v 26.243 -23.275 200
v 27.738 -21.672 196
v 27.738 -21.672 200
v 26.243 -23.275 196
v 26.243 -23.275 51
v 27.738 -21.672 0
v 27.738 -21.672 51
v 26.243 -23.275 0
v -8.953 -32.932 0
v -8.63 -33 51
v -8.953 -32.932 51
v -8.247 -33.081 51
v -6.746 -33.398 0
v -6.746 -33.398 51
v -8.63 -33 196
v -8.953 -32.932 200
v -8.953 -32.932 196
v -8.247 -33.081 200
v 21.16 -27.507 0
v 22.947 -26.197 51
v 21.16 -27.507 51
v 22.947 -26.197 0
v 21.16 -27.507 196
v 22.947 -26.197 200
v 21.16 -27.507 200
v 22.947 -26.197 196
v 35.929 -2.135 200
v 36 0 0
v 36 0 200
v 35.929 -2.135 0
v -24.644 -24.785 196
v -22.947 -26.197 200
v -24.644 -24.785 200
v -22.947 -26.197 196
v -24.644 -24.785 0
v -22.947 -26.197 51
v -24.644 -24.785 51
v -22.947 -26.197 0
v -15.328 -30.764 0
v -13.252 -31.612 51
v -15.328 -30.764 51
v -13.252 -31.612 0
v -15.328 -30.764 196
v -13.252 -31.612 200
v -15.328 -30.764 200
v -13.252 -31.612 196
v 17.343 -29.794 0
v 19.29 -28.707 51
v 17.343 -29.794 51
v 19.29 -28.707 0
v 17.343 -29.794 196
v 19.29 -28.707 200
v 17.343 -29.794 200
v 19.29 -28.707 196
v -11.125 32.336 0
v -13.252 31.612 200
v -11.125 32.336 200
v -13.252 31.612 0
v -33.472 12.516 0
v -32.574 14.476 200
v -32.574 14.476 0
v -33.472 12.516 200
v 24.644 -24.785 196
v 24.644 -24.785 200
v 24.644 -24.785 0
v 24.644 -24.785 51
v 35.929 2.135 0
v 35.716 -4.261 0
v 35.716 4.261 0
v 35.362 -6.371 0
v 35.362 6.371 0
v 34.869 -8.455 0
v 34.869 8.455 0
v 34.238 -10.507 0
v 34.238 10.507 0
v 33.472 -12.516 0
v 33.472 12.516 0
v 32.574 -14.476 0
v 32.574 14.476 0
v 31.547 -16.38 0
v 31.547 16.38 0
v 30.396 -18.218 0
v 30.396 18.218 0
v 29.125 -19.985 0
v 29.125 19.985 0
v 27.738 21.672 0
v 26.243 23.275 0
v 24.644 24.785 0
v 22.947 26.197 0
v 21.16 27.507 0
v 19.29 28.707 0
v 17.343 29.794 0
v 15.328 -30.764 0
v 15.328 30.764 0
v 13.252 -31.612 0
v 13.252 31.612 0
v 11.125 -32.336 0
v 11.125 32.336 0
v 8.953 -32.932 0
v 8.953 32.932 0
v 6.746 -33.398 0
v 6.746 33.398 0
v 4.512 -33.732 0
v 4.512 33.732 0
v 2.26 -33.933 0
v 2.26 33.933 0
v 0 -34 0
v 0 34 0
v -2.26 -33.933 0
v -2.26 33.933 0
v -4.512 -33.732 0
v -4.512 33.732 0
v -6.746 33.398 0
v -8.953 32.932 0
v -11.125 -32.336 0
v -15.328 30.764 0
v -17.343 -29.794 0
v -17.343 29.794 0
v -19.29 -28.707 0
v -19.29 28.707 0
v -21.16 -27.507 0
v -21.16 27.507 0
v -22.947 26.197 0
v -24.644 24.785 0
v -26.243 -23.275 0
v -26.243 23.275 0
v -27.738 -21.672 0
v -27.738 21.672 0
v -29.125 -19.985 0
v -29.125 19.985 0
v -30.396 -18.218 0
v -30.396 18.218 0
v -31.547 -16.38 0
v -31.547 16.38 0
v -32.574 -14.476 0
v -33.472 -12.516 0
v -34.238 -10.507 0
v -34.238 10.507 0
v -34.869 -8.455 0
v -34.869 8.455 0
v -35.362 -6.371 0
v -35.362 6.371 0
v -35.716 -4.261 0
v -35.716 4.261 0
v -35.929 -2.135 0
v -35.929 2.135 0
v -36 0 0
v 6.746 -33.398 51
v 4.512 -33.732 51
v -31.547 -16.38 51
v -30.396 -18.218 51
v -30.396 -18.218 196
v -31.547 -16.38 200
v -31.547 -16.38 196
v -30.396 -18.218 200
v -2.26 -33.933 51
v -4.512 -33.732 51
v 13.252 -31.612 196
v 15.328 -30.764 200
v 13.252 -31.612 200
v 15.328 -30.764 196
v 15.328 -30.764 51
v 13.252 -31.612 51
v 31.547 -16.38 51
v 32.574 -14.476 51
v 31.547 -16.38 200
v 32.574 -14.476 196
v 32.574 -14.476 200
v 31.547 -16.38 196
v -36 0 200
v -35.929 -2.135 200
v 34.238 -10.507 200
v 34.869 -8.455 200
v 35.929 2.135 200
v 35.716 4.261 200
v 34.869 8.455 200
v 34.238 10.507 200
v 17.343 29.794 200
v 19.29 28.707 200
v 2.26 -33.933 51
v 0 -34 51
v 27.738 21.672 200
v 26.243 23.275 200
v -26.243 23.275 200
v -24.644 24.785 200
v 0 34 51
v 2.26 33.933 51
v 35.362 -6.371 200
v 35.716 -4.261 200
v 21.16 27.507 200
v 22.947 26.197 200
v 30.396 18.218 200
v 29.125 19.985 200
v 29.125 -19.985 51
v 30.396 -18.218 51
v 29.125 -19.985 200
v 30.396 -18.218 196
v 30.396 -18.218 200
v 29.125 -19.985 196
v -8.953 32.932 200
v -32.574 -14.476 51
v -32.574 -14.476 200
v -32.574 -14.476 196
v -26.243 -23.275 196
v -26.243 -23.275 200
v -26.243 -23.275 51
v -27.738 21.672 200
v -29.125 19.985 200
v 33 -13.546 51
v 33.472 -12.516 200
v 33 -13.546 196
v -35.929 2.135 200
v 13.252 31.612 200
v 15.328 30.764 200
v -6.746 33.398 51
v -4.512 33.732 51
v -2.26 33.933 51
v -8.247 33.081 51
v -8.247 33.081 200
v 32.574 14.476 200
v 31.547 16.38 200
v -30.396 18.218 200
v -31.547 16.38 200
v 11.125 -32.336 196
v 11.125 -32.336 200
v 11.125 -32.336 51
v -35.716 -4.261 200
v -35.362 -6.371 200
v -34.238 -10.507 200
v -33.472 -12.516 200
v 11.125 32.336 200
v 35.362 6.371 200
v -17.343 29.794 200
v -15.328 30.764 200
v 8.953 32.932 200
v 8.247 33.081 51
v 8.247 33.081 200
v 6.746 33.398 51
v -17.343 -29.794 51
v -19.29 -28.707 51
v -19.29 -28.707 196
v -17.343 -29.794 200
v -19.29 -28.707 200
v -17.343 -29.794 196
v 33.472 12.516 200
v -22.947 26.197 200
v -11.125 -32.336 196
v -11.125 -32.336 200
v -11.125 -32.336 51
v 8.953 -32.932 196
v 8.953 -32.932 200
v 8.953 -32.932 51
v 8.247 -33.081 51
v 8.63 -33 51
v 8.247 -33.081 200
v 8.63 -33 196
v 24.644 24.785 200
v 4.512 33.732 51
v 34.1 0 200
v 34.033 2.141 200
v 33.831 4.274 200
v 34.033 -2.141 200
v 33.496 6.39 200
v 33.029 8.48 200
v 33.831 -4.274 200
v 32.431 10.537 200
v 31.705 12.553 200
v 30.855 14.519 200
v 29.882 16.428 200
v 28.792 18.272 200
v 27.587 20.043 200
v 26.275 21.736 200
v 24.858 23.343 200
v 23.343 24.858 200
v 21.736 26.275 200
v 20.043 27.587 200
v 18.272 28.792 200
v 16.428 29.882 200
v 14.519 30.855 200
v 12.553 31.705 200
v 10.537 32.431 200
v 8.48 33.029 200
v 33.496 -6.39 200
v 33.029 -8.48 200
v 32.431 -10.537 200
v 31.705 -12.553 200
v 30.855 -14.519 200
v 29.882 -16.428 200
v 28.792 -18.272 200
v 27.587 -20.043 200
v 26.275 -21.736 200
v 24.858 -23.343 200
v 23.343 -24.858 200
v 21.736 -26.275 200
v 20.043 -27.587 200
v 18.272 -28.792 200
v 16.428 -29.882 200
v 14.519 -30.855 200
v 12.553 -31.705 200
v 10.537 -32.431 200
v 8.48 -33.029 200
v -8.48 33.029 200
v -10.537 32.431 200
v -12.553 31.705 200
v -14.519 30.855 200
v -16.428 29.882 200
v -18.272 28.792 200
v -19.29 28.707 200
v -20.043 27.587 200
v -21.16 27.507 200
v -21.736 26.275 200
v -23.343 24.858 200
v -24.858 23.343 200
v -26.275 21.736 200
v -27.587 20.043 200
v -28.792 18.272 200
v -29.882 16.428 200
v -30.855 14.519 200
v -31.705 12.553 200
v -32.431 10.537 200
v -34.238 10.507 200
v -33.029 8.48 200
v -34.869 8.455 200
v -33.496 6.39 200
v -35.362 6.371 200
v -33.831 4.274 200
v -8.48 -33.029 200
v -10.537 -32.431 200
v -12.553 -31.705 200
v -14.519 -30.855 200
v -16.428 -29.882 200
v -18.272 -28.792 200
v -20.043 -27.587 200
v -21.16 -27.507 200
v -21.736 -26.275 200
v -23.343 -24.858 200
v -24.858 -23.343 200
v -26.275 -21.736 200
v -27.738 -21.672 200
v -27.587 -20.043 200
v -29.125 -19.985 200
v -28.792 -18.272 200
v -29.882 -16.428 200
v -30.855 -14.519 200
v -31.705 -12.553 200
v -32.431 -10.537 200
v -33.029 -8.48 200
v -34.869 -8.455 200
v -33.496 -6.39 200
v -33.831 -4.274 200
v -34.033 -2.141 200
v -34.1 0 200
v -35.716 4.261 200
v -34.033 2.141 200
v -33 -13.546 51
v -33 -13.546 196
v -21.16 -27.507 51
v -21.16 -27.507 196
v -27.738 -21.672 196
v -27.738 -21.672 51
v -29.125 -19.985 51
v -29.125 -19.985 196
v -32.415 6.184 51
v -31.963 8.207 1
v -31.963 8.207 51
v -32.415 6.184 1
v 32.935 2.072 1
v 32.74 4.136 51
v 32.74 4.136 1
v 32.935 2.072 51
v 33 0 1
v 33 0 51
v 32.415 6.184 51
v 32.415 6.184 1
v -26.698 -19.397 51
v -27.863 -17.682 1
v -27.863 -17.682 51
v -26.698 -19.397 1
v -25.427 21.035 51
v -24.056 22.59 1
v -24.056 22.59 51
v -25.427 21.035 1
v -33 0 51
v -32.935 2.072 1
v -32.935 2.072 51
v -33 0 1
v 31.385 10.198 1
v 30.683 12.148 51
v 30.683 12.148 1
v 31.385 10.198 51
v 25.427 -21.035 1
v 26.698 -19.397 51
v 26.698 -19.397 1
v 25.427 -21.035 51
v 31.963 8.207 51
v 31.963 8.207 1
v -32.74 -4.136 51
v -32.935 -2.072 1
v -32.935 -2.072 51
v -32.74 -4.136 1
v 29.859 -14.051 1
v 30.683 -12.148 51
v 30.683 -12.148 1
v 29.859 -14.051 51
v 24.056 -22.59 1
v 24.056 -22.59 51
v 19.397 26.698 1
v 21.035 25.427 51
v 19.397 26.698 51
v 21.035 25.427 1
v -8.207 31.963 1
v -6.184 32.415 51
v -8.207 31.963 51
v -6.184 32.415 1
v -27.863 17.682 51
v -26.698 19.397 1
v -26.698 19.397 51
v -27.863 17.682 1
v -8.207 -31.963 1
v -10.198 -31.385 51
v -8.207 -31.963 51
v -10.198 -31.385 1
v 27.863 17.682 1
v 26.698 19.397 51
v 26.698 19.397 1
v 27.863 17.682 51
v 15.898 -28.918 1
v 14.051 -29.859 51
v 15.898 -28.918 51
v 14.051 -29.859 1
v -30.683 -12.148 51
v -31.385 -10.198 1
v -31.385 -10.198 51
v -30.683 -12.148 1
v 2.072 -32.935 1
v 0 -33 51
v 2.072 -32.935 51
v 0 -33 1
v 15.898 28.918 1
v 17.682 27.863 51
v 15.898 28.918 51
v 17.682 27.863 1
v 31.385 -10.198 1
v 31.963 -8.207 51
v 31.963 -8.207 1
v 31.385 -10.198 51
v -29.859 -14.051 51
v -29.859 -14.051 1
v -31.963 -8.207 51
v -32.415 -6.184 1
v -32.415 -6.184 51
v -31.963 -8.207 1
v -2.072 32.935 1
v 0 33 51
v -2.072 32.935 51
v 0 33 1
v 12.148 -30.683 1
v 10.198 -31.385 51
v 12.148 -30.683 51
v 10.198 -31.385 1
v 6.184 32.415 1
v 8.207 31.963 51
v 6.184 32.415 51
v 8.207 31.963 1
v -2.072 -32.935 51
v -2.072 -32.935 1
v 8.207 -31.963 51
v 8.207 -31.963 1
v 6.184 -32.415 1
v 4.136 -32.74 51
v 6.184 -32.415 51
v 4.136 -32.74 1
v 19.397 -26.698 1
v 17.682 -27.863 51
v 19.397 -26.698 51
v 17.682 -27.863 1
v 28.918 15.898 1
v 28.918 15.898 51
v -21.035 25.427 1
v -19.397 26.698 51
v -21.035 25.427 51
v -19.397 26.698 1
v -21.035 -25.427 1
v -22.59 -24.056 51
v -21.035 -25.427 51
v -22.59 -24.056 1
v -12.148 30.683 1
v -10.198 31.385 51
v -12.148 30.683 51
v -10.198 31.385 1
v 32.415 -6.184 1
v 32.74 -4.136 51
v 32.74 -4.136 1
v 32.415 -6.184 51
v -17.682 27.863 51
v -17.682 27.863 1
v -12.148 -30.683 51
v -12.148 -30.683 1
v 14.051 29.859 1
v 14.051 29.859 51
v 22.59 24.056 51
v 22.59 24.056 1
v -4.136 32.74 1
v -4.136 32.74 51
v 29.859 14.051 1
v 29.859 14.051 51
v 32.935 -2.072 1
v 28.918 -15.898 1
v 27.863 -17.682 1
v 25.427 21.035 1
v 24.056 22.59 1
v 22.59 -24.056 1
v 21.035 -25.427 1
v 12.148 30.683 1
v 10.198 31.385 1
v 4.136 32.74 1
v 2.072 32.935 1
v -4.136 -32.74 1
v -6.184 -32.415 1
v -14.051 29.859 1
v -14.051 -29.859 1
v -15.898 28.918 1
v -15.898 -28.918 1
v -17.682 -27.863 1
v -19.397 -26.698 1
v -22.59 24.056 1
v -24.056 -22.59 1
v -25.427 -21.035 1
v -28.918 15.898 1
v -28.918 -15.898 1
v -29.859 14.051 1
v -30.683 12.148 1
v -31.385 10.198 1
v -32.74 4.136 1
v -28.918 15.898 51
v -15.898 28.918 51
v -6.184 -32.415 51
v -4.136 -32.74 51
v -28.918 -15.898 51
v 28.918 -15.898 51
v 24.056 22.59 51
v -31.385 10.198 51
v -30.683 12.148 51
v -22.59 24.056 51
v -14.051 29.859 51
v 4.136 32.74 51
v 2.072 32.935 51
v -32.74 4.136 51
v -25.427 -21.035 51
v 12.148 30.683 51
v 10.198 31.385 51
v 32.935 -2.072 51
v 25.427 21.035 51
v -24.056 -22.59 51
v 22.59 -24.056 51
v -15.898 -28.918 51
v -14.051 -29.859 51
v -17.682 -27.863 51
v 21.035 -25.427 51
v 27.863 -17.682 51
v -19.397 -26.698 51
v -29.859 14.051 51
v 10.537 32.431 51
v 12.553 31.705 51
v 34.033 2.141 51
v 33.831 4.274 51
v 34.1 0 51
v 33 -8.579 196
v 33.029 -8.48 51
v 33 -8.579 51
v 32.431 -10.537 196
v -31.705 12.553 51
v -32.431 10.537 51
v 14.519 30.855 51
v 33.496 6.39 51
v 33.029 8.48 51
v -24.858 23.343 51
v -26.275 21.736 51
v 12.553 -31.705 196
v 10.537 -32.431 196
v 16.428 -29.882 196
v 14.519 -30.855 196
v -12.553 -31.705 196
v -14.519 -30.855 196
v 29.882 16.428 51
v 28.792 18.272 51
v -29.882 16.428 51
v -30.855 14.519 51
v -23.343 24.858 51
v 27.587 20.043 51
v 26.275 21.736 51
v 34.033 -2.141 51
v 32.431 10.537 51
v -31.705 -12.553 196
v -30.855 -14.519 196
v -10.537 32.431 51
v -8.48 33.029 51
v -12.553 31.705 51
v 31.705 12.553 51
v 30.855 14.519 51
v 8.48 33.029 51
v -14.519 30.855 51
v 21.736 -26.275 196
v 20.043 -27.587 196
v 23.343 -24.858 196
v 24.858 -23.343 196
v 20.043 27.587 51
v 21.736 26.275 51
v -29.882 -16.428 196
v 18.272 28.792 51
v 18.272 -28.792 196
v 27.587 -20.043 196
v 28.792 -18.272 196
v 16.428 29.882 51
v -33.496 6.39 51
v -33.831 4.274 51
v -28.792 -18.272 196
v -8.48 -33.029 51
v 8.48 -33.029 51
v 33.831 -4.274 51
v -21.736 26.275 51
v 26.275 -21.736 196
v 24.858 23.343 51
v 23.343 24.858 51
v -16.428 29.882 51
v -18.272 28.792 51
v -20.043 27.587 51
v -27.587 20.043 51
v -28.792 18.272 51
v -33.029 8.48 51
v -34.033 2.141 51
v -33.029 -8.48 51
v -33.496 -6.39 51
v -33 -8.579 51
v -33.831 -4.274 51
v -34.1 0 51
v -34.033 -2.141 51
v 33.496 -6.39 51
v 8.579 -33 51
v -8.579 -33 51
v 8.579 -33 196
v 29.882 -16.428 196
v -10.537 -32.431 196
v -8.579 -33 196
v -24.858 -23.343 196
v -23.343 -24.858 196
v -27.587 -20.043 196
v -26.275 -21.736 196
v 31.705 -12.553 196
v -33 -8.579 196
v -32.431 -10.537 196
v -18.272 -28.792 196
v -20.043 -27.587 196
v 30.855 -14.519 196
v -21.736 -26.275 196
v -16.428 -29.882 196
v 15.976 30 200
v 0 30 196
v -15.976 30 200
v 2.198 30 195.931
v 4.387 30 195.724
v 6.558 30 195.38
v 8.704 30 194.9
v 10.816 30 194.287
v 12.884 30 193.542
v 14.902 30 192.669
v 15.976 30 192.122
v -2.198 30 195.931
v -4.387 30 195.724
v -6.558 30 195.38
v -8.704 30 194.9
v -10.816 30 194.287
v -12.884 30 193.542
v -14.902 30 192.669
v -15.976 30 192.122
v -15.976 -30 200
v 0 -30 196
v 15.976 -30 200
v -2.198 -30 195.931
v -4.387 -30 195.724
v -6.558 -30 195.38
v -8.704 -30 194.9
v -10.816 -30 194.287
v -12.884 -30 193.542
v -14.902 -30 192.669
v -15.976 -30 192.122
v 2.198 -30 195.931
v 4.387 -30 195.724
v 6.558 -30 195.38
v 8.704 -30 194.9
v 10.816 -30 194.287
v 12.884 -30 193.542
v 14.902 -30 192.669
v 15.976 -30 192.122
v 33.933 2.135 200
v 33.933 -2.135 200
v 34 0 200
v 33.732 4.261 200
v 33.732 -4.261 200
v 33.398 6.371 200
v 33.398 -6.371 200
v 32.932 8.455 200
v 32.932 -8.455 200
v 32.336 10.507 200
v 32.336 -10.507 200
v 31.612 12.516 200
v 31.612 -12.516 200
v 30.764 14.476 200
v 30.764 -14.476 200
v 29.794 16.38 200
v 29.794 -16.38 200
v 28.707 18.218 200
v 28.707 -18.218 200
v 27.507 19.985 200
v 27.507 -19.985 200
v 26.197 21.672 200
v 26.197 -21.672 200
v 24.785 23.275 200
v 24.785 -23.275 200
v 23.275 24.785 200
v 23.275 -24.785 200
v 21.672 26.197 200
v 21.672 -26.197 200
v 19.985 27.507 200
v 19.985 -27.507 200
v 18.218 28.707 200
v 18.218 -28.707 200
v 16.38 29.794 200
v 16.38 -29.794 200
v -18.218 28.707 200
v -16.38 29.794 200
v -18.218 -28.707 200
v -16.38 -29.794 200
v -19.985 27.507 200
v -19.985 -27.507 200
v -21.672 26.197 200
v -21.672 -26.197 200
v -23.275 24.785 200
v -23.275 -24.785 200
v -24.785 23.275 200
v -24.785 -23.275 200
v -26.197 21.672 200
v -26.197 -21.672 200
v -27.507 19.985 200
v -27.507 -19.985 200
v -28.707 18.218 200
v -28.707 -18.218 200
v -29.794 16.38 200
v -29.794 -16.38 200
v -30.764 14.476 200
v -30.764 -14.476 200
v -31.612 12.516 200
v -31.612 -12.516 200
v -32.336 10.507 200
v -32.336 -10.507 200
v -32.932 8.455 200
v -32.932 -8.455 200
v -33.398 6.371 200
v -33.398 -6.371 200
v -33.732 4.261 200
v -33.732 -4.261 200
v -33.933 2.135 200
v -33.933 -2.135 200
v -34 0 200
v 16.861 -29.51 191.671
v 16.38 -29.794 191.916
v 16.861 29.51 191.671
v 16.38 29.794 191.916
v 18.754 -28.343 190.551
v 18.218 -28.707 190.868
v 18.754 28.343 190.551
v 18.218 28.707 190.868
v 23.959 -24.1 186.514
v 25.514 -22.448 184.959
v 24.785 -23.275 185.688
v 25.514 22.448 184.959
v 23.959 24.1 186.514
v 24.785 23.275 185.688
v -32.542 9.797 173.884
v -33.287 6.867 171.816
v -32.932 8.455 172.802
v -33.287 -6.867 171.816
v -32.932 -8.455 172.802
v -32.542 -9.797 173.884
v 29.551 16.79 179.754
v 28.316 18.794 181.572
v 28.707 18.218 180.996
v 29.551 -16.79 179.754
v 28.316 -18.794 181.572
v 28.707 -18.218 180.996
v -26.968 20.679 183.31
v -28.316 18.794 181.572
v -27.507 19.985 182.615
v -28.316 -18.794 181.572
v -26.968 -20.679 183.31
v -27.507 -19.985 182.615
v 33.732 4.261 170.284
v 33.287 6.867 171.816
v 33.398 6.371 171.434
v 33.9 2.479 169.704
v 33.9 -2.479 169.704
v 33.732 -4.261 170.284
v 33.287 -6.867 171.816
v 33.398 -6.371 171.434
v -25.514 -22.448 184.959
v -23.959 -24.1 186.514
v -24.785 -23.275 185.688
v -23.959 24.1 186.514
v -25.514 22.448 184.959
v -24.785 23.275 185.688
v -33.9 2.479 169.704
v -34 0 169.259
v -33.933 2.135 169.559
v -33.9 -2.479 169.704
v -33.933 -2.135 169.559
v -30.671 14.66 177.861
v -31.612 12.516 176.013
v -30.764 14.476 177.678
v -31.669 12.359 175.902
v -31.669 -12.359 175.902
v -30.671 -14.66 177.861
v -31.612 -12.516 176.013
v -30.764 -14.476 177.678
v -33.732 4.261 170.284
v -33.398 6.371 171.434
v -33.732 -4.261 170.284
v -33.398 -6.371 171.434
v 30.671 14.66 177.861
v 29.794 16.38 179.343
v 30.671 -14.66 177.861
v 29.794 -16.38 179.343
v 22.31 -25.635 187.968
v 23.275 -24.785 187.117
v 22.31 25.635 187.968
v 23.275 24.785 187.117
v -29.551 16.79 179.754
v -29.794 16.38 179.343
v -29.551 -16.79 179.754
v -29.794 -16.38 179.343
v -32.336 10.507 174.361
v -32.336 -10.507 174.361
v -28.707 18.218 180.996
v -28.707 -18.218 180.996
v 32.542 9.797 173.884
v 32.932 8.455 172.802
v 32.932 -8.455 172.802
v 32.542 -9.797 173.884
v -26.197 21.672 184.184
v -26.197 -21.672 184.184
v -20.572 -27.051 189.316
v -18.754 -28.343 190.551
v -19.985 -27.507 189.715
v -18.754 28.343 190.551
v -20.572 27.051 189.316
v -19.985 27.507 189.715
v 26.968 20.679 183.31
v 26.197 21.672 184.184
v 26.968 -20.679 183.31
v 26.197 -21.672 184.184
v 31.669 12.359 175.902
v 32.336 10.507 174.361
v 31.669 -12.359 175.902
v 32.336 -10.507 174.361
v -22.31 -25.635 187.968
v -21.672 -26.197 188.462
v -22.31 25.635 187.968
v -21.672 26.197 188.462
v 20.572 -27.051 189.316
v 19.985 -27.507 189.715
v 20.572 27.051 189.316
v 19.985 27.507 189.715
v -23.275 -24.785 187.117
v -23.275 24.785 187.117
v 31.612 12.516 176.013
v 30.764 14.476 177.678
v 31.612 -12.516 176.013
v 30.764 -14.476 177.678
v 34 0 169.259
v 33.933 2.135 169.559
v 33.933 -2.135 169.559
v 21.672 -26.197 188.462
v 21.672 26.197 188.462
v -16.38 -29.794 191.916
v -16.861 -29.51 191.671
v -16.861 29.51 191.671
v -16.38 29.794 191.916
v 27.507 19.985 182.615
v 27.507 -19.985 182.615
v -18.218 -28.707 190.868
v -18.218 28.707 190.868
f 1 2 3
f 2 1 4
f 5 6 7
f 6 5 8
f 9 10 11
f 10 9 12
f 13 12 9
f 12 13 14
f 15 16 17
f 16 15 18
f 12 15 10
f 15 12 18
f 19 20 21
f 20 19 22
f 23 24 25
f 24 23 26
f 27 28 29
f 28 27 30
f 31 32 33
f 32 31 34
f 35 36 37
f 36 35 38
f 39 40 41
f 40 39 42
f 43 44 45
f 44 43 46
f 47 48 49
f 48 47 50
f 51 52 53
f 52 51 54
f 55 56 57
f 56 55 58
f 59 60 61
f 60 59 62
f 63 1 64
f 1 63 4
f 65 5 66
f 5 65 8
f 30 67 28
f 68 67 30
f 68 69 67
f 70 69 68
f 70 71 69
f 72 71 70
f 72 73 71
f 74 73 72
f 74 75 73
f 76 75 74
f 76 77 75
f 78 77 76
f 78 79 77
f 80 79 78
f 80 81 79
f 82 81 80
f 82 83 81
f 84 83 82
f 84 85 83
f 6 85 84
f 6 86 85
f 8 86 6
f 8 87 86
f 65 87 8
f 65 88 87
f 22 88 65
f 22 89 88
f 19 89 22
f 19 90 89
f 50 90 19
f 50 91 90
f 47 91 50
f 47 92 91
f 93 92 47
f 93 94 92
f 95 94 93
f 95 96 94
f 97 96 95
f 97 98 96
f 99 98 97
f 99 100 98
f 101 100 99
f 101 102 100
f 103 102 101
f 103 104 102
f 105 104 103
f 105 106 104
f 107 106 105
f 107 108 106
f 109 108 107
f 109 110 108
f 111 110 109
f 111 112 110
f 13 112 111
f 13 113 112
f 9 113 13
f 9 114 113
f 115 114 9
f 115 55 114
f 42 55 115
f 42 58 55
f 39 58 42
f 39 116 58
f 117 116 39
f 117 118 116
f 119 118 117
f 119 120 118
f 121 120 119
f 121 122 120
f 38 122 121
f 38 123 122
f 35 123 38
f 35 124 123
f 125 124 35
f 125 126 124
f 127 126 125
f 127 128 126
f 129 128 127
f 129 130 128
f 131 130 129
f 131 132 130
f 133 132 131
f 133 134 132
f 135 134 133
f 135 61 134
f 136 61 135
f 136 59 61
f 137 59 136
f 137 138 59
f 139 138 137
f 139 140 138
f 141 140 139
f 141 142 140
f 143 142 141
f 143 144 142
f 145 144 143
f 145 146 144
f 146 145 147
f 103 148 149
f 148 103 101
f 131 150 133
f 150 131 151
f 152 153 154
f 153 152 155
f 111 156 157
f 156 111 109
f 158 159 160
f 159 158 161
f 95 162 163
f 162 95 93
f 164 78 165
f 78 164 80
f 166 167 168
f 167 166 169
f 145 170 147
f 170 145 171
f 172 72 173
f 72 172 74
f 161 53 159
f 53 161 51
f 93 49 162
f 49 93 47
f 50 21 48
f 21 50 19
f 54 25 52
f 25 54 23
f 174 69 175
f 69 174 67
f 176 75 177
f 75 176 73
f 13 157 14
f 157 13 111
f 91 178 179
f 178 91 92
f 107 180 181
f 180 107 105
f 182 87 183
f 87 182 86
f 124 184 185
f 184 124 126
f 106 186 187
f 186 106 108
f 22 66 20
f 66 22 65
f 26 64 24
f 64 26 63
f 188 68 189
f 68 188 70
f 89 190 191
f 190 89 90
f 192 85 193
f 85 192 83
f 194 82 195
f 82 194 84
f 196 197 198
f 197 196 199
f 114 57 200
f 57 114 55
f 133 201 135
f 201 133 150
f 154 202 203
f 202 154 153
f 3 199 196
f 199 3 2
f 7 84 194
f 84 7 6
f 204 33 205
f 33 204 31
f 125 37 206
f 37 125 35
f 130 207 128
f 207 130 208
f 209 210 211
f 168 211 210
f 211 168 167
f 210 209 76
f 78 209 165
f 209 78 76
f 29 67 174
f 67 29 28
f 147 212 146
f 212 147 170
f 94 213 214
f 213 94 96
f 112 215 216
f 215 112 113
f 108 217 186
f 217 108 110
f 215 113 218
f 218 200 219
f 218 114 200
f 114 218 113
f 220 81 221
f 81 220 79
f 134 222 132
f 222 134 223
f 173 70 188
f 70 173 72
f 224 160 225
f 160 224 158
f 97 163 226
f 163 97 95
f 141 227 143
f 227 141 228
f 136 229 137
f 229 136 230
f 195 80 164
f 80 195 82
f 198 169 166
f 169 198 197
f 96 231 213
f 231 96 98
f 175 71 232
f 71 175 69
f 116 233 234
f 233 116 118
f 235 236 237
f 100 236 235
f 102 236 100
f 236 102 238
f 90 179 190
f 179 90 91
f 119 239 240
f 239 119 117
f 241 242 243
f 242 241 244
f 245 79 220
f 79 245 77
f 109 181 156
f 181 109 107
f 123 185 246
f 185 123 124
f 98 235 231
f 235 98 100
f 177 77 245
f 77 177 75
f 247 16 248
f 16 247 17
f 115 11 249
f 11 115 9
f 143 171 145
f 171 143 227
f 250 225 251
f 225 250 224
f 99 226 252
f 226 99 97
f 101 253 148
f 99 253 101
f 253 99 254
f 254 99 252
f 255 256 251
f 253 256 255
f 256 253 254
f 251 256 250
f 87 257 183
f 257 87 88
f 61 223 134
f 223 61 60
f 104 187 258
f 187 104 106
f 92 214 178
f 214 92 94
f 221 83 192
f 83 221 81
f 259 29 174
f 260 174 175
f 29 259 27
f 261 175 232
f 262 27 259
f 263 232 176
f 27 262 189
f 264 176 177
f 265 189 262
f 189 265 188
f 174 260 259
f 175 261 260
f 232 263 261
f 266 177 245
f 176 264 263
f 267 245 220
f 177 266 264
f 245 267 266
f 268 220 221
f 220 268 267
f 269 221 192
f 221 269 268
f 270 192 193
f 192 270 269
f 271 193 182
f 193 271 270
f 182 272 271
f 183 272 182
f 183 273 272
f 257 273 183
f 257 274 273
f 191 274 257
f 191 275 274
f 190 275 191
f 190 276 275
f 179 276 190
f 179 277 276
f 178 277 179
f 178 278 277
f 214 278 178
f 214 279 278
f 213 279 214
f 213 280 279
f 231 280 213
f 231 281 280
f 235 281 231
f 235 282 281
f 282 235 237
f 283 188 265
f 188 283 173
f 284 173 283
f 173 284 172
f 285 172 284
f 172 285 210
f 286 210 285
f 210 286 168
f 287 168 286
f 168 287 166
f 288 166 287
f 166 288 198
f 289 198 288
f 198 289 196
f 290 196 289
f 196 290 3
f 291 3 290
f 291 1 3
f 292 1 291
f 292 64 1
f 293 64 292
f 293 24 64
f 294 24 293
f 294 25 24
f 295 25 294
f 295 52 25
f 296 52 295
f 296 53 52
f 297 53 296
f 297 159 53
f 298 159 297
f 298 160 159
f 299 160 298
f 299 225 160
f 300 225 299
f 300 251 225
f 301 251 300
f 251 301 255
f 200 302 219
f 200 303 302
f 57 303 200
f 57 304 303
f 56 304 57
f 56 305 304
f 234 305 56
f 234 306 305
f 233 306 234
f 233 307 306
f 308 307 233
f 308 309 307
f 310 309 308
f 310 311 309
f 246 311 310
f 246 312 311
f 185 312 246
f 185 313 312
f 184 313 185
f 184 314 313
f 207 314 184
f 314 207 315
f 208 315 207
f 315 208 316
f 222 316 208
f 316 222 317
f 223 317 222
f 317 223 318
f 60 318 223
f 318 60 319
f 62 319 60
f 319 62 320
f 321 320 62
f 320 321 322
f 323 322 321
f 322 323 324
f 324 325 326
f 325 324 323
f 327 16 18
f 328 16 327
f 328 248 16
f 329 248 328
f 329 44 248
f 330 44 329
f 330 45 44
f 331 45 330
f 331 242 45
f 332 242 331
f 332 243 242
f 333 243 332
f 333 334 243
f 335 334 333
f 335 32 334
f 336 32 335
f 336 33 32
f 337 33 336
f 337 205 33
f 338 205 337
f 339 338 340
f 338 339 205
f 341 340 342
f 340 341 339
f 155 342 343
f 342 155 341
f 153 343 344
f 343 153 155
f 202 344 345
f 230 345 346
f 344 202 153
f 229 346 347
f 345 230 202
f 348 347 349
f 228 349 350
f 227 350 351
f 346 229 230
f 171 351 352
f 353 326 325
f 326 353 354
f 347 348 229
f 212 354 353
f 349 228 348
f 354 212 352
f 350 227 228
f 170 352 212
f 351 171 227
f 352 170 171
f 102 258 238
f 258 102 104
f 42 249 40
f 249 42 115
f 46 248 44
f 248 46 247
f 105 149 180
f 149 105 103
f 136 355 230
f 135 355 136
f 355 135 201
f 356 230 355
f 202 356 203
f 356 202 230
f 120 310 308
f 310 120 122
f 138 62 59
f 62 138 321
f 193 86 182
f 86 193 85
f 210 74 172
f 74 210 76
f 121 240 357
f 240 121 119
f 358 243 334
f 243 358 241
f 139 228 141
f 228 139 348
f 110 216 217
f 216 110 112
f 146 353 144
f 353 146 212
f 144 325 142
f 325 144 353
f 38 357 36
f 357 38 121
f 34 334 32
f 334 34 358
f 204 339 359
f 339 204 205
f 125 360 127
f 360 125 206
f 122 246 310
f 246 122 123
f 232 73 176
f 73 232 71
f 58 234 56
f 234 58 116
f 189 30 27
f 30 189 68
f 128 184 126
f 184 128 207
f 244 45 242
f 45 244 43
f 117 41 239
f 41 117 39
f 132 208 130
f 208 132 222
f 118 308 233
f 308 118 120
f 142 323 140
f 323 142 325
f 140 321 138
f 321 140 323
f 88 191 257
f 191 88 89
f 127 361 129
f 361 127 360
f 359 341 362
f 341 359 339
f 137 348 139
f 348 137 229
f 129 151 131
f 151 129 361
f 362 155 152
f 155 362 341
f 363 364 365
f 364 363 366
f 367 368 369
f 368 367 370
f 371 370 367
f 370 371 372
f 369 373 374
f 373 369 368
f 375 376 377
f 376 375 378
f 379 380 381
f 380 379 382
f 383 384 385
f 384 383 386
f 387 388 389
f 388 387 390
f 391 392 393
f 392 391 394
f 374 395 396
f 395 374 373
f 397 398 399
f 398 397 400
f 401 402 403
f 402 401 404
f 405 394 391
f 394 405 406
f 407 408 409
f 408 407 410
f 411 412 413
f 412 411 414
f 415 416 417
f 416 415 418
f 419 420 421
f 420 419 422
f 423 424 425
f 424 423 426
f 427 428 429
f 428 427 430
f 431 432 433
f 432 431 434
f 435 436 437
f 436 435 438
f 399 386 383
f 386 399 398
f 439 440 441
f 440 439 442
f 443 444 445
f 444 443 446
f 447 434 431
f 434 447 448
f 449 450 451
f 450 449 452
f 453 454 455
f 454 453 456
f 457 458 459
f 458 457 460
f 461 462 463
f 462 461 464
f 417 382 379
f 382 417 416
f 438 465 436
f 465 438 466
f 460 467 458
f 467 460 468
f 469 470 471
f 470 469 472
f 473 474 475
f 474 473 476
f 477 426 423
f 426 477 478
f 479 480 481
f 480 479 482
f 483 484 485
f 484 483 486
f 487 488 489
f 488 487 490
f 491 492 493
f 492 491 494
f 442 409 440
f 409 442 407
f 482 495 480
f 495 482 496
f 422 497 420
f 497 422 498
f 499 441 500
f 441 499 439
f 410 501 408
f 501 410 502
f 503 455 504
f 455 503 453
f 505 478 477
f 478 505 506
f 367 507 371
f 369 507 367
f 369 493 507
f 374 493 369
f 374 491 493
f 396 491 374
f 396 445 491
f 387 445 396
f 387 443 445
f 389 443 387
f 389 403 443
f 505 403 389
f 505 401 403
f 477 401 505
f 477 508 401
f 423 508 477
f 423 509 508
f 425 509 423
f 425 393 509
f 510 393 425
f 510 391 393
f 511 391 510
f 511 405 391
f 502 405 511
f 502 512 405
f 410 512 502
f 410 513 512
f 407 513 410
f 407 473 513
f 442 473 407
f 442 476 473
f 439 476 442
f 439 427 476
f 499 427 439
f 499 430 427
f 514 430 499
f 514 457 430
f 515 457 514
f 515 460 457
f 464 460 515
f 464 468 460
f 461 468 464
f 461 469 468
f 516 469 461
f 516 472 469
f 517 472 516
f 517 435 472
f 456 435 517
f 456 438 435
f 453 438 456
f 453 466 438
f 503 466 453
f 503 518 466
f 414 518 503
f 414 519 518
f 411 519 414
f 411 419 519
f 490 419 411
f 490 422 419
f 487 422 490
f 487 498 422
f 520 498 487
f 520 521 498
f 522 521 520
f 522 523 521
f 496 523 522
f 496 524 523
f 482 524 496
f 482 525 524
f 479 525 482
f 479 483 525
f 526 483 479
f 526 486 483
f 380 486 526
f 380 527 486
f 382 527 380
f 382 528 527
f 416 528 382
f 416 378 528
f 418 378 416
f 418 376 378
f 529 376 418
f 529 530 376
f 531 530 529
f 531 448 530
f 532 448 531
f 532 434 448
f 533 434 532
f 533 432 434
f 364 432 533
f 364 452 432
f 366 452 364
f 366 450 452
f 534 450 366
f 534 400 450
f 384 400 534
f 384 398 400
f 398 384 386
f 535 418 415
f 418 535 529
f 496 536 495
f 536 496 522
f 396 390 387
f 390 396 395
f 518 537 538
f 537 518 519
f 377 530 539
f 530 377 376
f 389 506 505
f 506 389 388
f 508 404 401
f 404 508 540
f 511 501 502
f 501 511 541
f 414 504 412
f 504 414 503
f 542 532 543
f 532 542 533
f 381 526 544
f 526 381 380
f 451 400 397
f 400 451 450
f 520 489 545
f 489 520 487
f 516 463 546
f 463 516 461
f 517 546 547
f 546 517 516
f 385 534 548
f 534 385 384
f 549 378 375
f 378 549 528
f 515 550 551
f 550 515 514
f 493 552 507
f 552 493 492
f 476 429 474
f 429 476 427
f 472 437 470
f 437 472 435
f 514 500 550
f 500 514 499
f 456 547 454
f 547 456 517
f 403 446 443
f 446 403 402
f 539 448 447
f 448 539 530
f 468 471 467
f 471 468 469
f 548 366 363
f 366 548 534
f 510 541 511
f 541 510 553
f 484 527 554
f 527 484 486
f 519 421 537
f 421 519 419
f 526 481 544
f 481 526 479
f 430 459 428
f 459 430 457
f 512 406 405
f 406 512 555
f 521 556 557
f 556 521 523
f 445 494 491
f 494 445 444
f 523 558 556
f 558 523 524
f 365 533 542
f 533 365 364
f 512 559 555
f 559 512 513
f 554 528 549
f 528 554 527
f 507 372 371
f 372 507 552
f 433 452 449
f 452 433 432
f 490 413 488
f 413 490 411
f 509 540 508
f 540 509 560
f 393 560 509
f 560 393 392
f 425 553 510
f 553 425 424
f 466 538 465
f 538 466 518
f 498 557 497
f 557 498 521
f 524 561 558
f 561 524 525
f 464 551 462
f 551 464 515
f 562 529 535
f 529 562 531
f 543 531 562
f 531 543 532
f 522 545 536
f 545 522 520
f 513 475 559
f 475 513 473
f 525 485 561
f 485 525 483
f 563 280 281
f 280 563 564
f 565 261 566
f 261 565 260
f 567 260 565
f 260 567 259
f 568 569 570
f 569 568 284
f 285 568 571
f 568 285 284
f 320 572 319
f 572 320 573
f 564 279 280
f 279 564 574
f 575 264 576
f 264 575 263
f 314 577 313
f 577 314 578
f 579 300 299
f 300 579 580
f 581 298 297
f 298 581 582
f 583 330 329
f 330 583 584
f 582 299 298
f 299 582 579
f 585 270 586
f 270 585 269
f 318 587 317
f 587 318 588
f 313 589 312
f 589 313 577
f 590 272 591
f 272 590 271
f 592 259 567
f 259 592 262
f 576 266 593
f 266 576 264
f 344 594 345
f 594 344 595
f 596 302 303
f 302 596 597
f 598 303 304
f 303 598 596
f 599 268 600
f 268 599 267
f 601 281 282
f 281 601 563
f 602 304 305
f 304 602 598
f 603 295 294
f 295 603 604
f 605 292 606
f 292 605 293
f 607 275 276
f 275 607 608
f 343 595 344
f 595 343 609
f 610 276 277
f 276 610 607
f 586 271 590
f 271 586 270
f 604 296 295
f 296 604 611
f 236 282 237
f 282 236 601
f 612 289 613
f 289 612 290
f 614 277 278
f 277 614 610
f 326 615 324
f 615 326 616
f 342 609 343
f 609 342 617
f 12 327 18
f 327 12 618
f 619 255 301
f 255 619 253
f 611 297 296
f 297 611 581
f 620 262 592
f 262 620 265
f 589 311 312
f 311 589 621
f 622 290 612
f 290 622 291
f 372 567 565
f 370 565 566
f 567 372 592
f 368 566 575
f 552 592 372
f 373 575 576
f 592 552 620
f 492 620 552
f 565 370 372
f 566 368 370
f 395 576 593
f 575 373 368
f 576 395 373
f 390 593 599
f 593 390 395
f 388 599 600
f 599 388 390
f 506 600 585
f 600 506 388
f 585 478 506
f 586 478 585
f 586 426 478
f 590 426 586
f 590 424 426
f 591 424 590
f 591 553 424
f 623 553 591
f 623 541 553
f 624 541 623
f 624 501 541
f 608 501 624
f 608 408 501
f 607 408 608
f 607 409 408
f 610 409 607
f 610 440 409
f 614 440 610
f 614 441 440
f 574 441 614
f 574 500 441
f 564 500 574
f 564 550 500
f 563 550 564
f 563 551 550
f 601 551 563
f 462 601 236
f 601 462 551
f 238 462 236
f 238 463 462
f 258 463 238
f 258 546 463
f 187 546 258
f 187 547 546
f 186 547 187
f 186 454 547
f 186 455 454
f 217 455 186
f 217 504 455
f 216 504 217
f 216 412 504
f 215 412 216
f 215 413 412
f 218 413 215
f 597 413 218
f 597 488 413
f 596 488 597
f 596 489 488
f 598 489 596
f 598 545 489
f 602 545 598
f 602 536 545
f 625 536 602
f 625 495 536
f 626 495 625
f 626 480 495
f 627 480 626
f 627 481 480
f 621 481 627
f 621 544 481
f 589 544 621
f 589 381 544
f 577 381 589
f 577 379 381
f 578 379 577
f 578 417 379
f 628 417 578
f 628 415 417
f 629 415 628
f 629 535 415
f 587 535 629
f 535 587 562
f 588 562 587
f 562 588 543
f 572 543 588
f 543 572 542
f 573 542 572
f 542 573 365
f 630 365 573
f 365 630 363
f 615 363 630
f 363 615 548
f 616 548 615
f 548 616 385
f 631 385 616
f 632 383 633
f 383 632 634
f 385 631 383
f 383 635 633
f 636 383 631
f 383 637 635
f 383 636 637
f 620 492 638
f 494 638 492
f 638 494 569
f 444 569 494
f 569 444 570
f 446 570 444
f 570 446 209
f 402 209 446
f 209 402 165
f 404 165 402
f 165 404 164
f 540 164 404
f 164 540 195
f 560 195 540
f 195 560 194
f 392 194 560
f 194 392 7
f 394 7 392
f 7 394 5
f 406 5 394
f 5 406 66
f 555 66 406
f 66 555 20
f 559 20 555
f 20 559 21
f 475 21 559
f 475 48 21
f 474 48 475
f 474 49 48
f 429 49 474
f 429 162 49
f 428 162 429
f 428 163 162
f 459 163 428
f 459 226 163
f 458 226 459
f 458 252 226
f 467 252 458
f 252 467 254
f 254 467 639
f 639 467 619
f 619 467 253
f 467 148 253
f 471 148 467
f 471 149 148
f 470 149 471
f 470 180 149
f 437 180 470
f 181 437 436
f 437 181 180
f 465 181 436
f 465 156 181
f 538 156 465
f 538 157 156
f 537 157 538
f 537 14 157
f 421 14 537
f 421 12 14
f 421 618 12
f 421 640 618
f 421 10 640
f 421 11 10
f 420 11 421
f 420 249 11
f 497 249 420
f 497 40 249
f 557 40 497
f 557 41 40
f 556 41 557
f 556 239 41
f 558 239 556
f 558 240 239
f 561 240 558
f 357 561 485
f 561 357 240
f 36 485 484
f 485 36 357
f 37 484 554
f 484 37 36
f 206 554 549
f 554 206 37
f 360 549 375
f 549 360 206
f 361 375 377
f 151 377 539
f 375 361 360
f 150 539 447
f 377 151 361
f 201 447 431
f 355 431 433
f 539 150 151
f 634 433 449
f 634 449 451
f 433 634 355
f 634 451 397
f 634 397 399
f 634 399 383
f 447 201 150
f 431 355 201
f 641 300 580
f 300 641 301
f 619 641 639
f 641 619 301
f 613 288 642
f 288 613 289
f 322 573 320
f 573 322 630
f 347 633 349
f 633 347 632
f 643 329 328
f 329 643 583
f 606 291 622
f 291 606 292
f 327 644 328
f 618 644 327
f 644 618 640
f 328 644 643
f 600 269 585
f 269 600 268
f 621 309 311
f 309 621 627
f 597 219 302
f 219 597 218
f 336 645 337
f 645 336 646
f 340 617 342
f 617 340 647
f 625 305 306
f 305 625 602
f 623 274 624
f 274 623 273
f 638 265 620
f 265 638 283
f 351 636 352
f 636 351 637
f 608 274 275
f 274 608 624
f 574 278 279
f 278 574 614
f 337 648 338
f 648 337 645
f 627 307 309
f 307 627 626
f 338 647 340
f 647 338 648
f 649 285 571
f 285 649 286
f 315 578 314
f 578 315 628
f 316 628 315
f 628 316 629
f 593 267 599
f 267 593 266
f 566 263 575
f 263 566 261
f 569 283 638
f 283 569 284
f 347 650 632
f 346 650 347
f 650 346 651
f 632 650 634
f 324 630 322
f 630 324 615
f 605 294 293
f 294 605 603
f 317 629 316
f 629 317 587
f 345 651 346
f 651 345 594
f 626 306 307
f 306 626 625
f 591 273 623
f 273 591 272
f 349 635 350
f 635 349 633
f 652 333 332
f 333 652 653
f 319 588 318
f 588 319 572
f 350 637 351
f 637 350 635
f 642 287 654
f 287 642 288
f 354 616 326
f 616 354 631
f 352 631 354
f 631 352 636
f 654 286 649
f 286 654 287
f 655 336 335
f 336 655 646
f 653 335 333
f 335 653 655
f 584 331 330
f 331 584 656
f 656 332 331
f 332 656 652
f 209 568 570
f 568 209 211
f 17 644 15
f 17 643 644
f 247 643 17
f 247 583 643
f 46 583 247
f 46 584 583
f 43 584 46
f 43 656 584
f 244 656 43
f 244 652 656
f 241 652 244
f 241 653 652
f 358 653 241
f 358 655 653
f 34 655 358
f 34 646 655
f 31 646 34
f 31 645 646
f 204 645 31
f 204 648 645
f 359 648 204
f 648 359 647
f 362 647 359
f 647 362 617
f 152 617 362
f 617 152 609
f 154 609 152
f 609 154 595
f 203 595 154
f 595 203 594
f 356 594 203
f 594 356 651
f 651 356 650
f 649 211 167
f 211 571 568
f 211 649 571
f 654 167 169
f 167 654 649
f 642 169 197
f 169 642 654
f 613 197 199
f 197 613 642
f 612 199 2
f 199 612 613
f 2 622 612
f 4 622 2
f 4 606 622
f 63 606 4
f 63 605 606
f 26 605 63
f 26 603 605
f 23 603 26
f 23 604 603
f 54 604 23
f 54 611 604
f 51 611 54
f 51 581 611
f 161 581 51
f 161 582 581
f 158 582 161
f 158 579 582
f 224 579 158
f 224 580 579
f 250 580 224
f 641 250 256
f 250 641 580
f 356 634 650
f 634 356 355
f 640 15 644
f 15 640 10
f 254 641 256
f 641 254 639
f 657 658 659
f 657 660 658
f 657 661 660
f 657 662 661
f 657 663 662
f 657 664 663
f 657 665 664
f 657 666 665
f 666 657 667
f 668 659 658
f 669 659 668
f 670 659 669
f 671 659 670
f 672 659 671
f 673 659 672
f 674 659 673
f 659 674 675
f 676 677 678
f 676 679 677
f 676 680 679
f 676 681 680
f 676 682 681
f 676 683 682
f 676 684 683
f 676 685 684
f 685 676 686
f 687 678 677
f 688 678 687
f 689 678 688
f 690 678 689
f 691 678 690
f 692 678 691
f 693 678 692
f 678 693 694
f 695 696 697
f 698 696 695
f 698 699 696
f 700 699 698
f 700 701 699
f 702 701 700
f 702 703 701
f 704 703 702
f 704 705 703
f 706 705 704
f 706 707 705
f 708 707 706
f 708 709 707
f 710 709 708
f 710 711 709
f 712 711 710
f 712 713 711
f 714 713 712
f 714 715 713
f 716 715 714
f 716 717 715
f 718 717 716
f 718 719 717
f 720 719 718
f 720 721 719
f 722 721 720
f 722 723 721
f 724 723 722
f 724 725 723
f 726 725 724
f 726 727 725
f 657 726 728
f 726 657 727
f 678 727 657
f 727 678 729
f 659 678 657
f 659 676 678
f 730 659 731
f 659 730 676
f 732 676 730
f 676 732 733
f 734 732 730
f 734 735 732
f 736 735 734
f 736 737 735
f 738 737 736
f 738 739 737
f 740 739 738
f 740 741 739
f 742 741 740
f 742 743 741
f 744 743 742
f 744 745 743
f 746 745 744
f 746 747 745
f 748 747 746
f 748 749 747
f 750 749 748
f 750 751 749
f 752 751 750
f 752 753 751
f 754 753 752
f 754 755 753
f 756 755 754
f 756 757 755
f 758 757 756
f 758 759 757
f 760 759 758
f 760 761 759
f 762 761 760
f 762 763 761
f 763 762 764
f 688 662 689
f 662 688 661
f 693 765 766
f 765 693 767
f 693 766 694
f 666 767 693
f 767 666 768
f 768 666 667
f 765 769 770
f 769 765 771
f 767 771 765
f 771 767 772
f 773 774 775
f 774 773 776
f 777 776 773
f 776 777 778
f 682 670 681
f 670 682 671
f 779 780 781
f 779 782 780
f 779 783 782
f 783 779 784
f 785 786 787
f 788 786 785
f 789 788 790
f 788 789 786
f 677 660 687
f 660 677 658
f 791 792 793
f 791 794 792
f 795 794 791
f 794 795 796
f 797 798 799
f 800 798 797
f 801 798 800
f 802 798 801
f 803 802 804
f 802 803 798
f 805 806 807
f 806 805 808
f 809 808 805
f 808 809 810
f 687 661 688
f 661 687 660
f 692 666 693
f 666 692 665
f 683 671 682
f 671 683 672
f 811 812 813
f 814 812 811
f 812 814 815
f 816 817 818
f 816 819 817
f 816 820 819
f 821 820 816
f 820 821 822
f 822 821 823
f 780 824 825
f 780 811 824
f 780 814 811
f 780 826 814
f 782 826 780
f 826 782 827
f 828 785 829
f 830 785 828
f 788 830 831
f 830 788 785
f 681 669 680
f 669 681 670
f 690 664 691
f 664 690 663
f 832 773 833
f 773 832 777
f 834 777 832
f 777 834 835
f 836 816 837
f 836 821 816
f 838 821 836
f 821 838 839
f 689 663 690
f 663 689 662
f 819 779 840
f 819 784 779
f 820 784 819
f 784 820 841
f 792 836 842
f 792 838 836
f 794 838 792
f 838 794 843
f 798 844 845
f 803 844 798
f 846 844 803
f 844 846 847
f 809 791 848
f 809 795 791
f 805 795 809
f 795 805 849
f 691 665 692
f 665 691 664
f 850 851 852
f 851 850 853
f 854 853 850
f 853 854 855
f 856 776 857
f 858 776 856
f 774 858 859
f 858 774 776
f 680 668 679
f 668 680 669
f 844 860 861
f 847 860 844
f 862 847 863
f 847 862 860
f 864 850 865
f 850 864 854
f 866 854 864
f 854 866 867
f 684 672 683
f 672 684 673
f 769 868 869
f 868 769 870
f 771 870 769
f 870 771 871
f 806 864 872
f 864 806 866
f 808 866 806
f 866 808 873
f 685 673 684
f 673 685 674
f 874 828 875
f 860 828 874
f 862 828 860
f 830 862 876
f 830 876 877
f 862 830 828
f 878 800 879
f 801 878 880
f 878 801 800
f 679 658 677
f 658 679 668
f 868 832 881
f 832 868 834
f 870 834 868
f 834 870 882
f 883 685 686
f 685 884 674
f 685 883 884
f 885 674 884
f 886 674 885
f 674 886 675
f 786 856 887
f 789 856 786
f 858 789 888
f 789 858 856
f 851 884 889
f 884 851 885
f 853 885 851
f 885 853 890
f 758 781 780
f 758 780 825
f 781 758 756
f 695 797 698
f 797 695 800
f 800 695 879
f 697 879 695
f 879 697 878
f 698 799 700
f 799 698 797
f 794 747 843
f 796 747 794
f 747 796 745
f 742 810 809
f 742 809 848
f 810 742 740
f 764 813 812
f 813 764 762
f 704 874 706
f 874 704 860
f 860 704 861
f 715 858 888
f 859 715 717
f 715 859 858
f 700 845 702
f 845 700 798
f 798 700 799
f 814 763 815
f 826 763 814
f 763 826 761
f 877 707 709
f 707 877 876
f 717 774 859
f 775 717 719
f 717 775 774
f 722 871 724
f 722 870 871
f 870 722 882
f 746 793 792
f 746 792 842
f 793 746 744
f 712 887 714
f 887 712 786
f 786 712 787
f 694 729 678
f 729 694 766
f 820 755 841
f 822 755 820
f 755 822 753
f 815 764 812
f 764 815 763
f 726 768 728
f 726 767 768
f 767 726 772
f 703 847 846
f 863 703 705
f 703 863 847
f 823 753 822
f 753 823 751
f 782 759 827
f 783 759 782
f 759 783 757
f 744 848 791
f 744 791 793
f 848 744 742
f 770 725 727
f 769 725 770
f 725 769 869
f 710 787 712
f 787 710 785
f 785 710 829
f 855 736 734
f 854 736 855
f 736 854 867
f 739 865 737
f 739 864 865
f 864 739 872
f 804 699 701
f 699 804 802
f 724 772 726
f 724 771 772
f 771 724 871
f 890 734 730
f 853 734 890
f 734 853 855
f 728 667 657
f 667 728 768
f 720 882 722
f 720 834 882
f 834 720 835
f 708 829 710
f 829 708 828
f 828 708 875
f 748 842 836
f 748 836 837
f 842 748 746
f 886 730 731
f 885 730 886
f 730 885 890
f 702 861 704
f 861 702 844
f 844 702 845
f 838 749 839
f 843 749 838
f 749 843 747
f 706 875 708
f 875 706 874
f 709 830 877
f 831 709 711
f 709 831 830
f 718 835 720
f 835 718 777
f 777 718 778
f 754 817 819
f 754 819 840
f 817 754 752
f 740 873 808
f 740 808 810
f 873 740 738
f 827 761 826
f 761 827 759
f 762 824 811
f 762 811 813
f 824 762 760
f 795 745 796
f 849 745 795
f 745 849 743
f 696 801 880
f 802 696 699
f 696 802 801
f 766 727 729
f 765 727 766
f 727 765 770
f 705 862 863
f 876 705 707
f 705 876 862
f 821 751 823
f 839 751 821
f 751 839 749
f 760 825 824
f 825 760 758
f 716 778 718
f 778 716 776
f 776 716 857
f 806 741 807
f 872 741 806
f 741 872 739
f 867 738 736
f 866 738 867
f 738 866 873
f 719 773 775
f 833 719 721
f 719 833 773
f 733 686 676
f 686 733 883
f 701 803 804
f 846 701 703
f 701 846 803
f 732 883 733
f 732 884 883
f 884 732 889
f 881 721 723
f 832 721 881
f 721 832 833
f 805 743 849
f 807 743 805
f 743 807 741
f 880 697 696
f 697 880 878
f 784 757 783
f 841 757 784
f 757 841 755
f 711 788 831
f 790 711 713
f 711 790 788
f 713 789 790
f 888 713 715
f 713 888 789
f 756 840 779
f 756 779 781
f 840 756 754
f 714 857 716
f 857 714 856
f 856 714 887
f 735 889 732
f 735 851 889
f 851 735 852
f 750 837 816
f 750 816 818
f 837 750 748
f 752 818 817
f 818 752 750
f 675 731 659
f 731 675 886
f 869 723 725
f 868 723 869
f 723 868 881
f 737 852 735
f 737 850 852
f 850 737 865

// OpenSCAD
wall = 1;
diameter = 66;
height = 100;
holder_thick=2;
holder_length=30;
$fn=100;

difference() {
    hull() {
        cylinder(h=height*2, r=diameter/2+wall);
        
        // translate([-diameter/2-holder_thick-wall, -holder_length/2, 0]) {
        //     cube([2*holder_thick + diameter + 2*wall, holder_length, height*2]);
        // }
        oval(diameter/2+wall+holder_thick, diameter/2+wall, height*2);
    }
    
    translate([0, 0, wall]) {
        cylinder(h=height*2-wall+.1, r=diameter/2);
    }
    translate([0, 0, wall + height/2]) {
        cylinder(h=height*2-wall+.1, r=diameter/2+wall+0.1);
    }
    
    translate([-diameter/2, -diameter/2, wall + height/2]) {
        cube([diameter, diameter/2, height*1.45]);
    }
}

difference() {
    translate([diameter/2+wall, -holder_length, height*2]) { 
        rotate([0, 90, 90]) {
            difference() {
                cube([diameter+2*wall, diameter+2*wall, holder_length*2]);
                
                translate([5+diameter/2+wall, diameter/2+wall, -.1]) {
                    cylinder(r=diameter/2+2*wall, h=holder_length*2+.2);
                }
                
                translate([diameter/2, -.1, -.1]) {
                    cube([diameter+2*wall, diameter+2*wall+.2, holder_length*2+.2]);
                }
            }
        }
    }

    translate([0, 0, height]) {
        difference() {
            cylinder(h=height*2, r=diameter/2+wall+100);
            
            translate([0, 0, -.1]) {
                cylinder(h=height*2+.2, r=diameter/2+wall);
            }
        }
    }
}




module oval(w,h, height, center = false) {
    scale([1, h/w, 1]) cylinder(h=height, r=w, center=center);
}
